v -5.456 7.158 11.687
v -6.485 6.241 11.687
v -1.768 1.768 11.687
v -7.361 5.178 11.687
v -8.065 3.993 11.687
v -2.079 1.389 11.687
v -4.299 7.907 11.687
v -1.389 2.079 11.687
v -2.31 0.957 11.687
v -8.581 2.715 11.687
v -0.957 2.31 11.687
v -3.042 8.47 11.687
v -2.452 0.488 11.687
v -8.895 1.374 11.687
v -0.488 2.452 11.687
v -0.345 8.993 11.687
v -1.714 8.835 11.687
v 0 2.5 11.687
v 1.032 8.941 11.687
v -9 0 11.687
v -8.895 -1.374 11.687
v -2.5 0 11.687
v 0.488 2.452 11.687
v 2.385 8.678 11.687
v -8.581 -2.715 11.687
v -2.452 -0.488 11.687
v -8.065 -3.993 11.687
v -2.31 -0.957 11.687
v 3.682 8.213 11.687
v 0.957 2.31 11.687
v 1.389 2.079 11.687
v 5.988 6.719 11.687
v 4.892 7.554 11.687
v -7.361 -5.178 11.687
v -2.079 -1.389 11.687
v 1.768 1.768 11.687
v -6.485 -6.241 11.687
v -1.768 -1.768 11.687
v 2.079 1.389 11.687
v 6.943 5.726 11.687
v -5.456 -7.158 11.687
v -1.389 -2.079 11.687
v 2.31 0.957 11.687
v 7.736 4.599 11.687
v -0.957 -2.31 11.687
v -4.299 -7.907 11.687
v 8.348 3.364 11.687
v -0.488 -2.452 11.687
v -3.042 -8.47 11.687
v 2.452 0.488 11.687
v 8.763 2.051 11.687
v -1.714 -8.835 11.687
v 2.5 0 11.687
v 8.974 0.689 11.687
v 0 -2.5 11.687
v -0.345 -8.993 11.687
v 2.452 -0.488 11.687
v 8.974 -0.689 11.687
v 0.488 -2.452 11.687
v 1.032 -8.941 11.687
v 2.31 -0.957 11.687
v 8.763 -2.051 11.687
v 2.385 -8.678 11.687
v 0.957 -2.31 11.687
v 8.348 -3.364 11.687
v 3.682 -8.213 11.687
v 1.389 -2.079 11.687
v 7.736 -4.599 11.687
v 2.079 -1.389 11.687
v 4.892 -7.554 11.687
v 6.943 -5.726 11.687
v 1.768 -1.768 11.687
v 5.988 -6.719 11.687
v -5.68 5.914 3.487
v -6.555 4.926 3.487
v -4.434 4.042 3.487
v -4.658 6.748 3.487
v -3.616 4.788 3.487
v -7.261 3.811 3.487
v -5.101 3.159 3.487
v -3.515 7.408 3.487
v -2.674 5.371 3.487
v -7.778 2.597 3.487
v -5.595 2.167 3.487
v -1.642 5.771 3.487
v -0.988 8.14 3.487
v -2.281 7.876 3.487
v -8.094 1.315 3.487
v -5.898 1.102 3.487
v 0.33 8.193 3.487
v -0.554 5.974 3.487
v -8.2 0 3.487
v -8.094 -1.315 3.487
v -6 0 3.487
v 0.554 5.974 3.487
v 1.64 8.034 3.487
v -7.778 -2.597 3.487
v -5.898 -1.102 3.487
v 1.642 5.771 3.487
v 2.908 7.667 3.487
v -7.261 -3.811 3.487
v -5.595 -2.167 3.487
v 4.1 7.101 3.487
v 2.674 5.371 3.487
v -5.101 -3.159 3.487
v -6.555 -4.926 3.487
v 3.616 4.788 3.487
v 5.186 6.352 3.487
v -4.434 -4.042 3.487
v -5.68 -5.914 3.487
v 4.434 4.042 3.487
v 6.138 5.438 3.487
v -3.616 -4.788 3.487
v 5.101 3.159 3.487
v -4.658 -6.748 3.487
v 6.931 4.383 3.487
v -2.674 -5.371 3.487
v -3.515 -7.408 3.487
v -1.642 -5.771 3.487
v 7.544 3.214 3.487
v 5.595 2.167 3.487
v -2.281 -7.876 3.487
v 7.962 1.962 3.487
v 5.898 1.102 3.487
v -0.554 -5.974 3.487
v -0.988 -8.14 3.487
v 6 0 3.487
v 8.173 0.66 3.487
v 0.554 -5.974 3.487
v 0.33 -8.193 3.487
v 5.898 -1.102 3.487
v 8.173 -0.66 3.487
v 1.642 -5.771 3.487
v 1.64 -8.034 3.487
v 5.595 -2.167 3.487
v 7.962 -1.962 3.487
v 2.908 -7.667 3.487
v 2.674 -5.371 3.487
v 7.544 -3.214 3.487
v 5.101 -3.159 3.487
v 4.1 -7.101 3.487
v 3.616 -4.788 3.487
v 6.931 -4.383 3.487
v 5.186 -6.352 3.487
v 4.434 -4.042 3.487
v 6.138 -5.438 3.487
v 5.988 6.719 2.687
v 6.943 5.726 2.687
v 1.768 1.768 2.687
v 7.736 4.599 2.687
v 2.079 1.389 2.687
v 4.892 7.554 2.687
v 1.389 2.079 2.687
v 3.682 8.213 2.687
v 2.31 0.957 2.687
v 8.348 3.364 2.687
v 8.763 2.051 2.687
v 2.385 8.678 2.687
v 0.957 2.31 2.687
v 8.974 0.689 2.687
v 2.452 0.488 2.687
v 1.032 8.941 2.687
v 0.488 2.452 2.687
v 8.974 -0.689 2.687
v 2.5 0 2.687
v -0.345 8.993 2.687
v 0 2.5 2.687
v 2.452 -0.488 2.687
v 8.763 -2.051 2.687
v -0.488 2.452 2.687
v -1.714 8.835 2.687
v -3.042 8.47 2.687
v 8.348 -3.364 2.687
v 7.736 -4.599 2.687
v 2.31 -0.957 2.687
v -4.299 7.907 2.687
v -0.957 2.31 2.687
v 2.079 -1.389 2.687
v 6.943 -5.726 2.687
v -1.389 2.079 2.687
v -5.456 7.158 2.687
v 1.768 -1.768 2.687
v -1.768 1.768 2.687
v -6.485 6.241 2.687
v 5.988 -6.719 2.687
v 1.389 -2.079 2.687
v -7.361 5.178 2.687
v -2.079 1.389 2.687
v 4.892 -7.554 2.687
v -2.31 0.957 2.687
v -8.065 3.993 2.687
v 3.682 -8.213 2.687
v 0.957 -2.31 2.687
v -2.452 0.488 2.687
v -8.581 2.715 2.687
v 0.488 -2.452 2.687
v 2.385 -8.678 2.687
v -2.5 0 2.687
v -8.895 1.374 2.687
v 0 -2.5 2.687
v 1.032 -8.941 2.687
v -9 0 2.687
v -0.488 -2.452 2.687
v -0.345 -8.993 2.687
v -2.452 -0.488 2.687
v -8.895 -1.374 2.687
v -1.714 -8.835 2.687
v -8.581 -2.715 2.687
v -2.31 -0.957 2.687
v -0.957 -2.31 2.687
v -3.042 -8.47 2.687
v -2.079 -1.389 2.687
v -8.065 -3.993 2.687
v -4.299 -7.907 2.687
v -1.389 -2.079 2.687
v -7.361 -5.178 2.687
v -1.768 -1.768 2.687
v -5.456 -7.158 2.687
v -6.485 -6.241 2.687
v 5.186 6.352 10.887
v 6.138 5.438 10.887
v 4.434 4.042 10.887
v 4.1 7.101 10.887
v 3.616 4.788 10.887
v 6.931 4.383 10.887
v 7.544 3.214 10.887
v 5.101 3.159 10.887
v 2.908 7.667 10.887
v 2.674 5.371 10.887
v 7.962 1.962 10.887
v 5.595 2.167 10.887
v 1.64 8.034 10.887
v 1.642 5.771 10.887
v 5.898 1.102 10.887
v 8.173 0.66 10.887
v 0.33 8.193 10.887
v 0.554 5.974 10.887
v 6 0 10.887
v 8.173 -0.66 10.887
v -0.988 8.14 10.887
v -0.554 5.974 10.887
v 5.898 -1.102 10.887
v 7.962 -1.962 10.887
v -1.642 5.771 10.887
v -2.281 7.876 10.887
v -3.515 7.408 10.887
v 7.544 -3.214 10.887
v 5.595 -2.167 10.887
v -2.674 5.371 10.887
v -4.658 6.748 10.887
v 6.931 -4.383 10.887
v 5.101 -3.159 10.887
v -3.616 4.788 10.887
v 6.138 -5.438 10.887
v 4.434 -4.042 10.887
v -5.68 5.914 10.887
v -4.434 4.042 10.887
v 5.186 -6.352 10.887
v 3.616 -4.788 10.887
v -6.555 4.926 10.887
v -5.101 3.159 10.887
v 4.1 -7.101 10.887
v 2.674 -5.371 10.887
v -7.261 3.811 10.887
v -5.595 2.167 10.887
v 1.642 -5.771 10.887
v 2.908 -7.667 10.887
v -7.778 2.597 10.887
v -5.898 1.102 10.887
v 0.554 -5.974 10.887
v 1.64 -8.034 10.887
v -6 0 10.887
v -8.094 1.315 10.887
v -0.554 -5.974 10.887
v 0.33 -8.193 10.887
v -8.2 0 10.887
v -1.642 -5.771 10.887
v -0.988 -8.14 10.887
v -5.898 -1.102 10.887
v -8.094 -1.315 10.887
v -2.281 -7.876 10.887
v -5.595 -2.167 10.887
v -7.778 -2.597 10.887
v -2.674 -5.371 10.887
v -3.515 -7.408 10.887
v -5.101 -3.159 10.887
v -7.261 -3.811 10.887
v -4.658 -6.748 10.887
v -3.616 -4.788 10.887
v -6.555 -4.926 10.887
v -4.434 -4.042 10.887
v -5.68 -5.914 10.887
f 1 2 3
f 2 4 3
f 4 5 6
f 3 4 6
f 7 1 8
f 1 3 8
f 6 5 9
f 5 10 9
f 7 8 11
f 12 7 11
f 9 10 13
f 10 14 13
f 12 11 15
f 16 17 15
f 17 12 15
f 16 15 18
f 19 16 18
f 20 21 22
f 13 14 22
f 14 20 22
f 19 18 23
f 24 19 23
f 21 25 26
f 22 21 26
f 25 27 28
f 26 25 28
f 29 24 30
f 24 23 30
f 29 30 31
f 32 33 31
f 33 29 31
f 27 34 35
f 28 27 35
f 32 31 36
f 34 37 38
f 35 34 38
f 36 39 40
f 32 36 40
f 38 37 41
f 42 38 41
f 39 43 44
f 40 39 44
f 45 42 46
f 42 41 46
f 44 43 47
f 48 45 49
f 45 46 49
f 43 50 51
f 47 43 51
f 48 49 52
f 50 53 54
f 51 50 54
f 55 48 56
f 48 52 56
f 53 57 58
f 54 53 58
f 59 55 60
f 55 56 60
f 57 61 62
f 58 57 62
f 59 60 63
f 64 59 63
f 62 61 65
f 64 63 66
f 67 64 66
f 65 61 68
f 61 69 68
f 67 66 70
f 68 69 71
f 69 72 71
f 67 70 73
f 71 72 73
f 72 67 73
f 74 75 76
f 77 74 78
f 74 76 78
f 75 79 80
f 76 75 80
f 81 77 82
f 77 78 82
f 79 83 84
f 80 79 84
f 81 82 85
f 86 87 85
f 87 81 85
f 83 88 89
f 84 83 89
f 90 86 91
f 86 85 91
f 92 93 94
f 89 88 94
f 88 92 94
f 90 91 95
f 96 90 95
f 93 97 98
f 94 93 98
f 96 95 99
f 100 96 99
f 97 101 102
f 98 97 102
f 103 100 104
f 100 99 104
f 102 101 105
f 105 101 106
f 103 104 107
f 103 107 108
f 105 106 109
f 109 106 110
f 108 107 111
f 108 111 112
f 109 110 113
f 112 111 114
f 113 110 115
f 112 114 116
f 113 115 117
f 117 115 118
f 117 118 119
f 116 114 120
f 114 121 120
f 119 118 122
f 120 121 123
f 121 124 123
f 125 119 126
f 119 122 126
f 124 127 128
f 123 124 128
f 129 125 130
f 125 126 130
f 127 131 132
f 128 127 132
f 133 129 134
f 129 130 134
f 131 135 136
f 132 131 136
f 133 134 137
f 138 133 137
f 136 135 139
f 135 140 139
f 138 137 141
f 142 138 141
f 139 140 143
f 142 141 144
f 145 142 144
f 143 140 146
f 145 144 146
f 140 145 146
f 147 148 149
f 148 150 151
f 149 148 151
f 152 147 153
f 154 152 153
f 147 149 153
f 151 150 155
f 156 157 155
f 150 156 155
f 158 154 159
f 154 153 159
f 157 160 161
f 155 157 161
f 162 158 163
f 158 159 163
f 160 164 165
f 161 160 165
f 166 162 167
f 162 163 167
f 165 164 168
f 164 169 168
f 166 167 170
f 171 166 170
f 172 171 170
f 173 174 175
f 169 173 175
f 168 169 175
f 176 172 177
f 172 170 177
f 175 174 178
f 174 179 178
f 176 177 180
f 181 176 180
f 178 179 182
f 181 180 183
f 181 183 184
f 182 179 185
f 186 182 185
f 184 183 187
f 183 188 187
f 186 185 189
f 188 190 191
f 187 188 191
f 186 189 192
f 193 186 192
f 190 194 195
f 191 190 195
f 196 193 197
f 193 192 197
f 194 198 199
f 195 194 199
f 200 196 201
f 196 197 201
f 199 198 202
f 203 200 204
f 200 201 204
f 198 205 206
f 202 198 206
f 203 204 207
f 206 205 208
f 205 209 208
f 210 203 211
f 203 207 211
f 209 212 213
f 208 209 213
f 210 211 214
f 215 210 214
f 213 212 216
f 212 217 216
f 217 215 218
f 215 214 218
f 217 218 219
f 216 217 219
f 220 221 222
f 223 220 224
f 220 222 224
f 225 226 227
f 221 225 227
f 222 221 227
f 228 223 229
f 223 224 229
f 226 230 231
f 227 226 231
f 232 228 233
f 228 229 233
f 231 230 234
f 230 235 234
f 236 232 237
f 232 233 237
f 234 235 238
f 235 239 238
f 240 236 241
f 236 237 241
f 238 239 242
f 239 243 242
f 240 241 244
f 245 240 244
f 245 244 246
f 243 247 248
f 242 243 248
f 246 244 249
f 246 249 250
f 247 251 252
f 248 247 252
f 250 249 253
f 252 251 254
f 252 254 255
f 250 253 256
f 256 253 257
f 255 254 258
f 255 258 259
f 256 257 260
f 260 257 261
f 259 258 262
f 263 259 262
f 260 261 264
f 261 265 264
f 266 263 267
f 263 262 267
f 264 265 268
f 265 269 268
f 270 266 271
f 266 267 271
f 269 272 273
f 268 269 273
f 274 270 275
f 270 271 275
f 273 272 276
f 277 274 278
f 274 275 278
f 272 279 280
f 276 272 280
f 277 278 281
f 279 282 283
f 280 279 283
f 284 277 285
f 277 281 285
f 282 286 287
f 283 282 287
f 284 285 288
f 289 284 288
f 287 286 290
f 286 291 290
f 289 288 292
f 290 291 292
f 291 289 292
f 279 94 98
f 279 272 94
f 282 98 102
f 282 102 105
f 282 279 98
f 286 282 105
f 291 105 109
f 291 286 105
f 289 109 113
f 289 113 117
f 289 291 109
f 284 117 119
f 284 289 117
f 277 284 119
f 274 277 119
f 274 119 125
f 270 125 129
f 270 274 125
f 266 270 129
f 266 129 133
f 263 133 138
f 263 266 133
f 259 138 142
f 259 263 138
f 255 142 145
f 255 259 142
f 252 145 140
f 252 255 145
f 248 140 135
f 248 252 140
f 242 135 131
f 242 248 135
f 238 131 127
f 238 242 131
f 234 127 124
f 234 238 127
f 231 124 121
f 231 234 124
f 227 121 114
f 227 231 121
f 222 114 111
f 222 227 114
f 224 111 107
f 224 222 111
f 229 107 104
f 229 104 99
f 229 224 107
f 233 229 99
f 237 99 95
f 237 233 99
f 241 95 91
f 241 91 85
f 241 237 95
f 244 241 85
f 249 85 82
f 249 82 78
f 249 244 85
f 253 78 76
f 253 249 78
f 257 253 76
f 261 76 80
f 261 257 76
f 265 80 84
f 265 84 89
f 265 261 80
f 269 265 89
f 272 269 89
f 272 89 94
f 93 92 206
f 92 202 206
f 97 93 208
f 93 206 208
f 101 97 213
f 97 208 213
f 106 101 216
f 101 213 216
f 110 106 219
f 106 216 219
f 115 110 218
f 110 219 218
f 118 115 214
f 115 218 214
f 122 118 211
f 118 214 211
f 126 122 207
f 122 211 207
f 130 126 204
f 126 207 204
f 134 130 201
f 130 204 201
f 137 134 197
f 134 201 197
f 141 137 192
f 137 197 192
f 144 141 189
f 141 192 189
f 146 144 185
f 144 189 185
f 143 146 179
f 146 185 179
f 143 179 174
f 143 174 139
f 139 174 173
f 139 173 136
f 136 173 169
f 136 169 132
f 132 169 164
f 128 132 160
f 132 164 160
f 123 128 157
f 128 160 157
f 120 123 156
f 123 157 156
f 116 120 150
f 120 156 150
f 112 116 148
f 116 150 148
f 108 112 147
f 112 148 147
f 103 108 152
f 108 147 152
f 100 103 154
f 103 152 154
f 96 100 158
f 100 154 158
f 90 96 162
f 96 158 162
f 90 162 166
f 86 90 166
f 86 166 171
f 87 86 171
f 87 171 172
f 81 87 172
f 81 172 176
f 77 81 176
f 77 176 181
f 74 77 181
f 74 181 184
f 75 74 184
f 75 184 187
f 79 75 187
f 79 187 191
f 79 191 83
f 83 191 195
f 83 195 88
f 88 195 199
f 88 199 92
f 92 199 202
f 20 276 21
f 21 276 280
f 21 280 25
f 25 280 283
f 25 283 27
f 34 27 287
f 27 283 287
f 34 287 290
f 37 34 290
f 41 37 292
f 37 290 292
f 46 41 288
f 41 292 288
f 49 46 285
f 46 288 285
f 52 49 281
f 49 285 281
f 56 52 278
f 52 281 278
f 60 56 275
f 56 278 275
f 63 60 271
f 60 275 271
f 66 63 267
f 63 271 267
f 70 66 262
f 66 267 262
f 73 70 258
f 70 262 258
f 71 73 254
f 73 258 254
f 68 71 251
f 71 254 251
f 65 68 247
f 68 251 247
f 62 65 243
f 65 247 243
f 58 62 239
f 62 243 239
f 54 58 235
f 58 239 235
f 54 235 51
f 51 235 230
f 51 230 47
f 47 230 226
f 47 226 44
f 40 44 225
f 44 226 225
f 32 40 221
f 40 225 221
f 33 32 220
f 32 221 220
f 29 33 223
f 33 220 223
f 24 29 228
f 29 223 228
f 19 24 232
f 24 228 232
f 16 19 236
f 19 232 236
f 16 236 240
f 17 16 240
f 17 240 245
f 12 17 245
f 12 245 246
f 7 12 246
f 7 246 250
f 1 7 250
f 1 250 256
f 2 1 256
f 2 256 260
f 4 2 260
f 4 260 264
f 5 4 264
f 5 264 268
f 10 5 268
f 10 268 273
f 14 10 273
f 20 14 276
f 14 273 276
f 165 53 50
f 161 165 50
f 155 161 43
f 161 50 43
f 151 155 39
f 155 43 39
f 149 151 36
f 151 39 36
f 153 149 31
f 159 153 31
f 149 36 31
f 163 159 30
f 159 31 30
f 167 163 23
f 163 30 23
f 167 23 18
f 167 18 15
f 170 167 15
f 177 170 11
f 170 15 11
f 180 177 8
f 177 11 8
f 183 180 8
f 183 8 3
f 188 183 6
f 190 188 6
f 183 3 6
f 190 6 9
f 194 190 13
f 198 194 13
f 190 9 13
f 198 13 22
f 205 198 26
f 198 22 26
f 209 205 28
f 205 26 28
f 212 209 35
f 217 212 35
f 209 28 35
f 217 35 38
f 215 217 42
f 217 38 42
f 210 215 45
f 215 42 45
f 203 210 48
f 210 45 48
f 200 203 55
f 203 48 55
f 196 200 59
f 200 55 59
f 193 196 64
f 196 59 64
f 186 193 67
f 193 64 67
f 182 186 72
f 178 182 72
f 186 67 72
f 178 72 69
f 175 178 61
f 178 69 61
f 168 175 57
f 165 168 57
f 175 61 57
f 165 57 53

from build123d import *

# Parameters (mm, degrees)
F0_W     = 6
F0_H     = 7.4
F2_R     = 2.5
F3_DEPTH = 9


with BuildPart() as f1:
    # F0 (on Front) → F1 (revolve)
    with BuildSketch(Plane.XZ):
        Polygon((0, 11.687311), (-9, 11.687311), (-8.2, 10.887311), (-6, 10.887311), (0, 10.887311), align=None)
        with Locations((-3, 7.187311)):
            Rectangle(F0_W, F0_H)
        Polygon((0, 2.687311), (0, 3.487311), (-6, 3.487311), (-8.2, 3.487311), (-9, 2.687311), align=None)
    revolve(axis=Axis((0, 0, 3.487311), (0, 0, 1)))

    # F2 (on face) → F3 (cut, through all)
    with BuildSketch(Plane.XY.offset(11.687311)):
        Circle(F2_R)
    extrude(amount=-F3_DEPTH, mode=Mode.SUBTRACT)


solid = f1.part
